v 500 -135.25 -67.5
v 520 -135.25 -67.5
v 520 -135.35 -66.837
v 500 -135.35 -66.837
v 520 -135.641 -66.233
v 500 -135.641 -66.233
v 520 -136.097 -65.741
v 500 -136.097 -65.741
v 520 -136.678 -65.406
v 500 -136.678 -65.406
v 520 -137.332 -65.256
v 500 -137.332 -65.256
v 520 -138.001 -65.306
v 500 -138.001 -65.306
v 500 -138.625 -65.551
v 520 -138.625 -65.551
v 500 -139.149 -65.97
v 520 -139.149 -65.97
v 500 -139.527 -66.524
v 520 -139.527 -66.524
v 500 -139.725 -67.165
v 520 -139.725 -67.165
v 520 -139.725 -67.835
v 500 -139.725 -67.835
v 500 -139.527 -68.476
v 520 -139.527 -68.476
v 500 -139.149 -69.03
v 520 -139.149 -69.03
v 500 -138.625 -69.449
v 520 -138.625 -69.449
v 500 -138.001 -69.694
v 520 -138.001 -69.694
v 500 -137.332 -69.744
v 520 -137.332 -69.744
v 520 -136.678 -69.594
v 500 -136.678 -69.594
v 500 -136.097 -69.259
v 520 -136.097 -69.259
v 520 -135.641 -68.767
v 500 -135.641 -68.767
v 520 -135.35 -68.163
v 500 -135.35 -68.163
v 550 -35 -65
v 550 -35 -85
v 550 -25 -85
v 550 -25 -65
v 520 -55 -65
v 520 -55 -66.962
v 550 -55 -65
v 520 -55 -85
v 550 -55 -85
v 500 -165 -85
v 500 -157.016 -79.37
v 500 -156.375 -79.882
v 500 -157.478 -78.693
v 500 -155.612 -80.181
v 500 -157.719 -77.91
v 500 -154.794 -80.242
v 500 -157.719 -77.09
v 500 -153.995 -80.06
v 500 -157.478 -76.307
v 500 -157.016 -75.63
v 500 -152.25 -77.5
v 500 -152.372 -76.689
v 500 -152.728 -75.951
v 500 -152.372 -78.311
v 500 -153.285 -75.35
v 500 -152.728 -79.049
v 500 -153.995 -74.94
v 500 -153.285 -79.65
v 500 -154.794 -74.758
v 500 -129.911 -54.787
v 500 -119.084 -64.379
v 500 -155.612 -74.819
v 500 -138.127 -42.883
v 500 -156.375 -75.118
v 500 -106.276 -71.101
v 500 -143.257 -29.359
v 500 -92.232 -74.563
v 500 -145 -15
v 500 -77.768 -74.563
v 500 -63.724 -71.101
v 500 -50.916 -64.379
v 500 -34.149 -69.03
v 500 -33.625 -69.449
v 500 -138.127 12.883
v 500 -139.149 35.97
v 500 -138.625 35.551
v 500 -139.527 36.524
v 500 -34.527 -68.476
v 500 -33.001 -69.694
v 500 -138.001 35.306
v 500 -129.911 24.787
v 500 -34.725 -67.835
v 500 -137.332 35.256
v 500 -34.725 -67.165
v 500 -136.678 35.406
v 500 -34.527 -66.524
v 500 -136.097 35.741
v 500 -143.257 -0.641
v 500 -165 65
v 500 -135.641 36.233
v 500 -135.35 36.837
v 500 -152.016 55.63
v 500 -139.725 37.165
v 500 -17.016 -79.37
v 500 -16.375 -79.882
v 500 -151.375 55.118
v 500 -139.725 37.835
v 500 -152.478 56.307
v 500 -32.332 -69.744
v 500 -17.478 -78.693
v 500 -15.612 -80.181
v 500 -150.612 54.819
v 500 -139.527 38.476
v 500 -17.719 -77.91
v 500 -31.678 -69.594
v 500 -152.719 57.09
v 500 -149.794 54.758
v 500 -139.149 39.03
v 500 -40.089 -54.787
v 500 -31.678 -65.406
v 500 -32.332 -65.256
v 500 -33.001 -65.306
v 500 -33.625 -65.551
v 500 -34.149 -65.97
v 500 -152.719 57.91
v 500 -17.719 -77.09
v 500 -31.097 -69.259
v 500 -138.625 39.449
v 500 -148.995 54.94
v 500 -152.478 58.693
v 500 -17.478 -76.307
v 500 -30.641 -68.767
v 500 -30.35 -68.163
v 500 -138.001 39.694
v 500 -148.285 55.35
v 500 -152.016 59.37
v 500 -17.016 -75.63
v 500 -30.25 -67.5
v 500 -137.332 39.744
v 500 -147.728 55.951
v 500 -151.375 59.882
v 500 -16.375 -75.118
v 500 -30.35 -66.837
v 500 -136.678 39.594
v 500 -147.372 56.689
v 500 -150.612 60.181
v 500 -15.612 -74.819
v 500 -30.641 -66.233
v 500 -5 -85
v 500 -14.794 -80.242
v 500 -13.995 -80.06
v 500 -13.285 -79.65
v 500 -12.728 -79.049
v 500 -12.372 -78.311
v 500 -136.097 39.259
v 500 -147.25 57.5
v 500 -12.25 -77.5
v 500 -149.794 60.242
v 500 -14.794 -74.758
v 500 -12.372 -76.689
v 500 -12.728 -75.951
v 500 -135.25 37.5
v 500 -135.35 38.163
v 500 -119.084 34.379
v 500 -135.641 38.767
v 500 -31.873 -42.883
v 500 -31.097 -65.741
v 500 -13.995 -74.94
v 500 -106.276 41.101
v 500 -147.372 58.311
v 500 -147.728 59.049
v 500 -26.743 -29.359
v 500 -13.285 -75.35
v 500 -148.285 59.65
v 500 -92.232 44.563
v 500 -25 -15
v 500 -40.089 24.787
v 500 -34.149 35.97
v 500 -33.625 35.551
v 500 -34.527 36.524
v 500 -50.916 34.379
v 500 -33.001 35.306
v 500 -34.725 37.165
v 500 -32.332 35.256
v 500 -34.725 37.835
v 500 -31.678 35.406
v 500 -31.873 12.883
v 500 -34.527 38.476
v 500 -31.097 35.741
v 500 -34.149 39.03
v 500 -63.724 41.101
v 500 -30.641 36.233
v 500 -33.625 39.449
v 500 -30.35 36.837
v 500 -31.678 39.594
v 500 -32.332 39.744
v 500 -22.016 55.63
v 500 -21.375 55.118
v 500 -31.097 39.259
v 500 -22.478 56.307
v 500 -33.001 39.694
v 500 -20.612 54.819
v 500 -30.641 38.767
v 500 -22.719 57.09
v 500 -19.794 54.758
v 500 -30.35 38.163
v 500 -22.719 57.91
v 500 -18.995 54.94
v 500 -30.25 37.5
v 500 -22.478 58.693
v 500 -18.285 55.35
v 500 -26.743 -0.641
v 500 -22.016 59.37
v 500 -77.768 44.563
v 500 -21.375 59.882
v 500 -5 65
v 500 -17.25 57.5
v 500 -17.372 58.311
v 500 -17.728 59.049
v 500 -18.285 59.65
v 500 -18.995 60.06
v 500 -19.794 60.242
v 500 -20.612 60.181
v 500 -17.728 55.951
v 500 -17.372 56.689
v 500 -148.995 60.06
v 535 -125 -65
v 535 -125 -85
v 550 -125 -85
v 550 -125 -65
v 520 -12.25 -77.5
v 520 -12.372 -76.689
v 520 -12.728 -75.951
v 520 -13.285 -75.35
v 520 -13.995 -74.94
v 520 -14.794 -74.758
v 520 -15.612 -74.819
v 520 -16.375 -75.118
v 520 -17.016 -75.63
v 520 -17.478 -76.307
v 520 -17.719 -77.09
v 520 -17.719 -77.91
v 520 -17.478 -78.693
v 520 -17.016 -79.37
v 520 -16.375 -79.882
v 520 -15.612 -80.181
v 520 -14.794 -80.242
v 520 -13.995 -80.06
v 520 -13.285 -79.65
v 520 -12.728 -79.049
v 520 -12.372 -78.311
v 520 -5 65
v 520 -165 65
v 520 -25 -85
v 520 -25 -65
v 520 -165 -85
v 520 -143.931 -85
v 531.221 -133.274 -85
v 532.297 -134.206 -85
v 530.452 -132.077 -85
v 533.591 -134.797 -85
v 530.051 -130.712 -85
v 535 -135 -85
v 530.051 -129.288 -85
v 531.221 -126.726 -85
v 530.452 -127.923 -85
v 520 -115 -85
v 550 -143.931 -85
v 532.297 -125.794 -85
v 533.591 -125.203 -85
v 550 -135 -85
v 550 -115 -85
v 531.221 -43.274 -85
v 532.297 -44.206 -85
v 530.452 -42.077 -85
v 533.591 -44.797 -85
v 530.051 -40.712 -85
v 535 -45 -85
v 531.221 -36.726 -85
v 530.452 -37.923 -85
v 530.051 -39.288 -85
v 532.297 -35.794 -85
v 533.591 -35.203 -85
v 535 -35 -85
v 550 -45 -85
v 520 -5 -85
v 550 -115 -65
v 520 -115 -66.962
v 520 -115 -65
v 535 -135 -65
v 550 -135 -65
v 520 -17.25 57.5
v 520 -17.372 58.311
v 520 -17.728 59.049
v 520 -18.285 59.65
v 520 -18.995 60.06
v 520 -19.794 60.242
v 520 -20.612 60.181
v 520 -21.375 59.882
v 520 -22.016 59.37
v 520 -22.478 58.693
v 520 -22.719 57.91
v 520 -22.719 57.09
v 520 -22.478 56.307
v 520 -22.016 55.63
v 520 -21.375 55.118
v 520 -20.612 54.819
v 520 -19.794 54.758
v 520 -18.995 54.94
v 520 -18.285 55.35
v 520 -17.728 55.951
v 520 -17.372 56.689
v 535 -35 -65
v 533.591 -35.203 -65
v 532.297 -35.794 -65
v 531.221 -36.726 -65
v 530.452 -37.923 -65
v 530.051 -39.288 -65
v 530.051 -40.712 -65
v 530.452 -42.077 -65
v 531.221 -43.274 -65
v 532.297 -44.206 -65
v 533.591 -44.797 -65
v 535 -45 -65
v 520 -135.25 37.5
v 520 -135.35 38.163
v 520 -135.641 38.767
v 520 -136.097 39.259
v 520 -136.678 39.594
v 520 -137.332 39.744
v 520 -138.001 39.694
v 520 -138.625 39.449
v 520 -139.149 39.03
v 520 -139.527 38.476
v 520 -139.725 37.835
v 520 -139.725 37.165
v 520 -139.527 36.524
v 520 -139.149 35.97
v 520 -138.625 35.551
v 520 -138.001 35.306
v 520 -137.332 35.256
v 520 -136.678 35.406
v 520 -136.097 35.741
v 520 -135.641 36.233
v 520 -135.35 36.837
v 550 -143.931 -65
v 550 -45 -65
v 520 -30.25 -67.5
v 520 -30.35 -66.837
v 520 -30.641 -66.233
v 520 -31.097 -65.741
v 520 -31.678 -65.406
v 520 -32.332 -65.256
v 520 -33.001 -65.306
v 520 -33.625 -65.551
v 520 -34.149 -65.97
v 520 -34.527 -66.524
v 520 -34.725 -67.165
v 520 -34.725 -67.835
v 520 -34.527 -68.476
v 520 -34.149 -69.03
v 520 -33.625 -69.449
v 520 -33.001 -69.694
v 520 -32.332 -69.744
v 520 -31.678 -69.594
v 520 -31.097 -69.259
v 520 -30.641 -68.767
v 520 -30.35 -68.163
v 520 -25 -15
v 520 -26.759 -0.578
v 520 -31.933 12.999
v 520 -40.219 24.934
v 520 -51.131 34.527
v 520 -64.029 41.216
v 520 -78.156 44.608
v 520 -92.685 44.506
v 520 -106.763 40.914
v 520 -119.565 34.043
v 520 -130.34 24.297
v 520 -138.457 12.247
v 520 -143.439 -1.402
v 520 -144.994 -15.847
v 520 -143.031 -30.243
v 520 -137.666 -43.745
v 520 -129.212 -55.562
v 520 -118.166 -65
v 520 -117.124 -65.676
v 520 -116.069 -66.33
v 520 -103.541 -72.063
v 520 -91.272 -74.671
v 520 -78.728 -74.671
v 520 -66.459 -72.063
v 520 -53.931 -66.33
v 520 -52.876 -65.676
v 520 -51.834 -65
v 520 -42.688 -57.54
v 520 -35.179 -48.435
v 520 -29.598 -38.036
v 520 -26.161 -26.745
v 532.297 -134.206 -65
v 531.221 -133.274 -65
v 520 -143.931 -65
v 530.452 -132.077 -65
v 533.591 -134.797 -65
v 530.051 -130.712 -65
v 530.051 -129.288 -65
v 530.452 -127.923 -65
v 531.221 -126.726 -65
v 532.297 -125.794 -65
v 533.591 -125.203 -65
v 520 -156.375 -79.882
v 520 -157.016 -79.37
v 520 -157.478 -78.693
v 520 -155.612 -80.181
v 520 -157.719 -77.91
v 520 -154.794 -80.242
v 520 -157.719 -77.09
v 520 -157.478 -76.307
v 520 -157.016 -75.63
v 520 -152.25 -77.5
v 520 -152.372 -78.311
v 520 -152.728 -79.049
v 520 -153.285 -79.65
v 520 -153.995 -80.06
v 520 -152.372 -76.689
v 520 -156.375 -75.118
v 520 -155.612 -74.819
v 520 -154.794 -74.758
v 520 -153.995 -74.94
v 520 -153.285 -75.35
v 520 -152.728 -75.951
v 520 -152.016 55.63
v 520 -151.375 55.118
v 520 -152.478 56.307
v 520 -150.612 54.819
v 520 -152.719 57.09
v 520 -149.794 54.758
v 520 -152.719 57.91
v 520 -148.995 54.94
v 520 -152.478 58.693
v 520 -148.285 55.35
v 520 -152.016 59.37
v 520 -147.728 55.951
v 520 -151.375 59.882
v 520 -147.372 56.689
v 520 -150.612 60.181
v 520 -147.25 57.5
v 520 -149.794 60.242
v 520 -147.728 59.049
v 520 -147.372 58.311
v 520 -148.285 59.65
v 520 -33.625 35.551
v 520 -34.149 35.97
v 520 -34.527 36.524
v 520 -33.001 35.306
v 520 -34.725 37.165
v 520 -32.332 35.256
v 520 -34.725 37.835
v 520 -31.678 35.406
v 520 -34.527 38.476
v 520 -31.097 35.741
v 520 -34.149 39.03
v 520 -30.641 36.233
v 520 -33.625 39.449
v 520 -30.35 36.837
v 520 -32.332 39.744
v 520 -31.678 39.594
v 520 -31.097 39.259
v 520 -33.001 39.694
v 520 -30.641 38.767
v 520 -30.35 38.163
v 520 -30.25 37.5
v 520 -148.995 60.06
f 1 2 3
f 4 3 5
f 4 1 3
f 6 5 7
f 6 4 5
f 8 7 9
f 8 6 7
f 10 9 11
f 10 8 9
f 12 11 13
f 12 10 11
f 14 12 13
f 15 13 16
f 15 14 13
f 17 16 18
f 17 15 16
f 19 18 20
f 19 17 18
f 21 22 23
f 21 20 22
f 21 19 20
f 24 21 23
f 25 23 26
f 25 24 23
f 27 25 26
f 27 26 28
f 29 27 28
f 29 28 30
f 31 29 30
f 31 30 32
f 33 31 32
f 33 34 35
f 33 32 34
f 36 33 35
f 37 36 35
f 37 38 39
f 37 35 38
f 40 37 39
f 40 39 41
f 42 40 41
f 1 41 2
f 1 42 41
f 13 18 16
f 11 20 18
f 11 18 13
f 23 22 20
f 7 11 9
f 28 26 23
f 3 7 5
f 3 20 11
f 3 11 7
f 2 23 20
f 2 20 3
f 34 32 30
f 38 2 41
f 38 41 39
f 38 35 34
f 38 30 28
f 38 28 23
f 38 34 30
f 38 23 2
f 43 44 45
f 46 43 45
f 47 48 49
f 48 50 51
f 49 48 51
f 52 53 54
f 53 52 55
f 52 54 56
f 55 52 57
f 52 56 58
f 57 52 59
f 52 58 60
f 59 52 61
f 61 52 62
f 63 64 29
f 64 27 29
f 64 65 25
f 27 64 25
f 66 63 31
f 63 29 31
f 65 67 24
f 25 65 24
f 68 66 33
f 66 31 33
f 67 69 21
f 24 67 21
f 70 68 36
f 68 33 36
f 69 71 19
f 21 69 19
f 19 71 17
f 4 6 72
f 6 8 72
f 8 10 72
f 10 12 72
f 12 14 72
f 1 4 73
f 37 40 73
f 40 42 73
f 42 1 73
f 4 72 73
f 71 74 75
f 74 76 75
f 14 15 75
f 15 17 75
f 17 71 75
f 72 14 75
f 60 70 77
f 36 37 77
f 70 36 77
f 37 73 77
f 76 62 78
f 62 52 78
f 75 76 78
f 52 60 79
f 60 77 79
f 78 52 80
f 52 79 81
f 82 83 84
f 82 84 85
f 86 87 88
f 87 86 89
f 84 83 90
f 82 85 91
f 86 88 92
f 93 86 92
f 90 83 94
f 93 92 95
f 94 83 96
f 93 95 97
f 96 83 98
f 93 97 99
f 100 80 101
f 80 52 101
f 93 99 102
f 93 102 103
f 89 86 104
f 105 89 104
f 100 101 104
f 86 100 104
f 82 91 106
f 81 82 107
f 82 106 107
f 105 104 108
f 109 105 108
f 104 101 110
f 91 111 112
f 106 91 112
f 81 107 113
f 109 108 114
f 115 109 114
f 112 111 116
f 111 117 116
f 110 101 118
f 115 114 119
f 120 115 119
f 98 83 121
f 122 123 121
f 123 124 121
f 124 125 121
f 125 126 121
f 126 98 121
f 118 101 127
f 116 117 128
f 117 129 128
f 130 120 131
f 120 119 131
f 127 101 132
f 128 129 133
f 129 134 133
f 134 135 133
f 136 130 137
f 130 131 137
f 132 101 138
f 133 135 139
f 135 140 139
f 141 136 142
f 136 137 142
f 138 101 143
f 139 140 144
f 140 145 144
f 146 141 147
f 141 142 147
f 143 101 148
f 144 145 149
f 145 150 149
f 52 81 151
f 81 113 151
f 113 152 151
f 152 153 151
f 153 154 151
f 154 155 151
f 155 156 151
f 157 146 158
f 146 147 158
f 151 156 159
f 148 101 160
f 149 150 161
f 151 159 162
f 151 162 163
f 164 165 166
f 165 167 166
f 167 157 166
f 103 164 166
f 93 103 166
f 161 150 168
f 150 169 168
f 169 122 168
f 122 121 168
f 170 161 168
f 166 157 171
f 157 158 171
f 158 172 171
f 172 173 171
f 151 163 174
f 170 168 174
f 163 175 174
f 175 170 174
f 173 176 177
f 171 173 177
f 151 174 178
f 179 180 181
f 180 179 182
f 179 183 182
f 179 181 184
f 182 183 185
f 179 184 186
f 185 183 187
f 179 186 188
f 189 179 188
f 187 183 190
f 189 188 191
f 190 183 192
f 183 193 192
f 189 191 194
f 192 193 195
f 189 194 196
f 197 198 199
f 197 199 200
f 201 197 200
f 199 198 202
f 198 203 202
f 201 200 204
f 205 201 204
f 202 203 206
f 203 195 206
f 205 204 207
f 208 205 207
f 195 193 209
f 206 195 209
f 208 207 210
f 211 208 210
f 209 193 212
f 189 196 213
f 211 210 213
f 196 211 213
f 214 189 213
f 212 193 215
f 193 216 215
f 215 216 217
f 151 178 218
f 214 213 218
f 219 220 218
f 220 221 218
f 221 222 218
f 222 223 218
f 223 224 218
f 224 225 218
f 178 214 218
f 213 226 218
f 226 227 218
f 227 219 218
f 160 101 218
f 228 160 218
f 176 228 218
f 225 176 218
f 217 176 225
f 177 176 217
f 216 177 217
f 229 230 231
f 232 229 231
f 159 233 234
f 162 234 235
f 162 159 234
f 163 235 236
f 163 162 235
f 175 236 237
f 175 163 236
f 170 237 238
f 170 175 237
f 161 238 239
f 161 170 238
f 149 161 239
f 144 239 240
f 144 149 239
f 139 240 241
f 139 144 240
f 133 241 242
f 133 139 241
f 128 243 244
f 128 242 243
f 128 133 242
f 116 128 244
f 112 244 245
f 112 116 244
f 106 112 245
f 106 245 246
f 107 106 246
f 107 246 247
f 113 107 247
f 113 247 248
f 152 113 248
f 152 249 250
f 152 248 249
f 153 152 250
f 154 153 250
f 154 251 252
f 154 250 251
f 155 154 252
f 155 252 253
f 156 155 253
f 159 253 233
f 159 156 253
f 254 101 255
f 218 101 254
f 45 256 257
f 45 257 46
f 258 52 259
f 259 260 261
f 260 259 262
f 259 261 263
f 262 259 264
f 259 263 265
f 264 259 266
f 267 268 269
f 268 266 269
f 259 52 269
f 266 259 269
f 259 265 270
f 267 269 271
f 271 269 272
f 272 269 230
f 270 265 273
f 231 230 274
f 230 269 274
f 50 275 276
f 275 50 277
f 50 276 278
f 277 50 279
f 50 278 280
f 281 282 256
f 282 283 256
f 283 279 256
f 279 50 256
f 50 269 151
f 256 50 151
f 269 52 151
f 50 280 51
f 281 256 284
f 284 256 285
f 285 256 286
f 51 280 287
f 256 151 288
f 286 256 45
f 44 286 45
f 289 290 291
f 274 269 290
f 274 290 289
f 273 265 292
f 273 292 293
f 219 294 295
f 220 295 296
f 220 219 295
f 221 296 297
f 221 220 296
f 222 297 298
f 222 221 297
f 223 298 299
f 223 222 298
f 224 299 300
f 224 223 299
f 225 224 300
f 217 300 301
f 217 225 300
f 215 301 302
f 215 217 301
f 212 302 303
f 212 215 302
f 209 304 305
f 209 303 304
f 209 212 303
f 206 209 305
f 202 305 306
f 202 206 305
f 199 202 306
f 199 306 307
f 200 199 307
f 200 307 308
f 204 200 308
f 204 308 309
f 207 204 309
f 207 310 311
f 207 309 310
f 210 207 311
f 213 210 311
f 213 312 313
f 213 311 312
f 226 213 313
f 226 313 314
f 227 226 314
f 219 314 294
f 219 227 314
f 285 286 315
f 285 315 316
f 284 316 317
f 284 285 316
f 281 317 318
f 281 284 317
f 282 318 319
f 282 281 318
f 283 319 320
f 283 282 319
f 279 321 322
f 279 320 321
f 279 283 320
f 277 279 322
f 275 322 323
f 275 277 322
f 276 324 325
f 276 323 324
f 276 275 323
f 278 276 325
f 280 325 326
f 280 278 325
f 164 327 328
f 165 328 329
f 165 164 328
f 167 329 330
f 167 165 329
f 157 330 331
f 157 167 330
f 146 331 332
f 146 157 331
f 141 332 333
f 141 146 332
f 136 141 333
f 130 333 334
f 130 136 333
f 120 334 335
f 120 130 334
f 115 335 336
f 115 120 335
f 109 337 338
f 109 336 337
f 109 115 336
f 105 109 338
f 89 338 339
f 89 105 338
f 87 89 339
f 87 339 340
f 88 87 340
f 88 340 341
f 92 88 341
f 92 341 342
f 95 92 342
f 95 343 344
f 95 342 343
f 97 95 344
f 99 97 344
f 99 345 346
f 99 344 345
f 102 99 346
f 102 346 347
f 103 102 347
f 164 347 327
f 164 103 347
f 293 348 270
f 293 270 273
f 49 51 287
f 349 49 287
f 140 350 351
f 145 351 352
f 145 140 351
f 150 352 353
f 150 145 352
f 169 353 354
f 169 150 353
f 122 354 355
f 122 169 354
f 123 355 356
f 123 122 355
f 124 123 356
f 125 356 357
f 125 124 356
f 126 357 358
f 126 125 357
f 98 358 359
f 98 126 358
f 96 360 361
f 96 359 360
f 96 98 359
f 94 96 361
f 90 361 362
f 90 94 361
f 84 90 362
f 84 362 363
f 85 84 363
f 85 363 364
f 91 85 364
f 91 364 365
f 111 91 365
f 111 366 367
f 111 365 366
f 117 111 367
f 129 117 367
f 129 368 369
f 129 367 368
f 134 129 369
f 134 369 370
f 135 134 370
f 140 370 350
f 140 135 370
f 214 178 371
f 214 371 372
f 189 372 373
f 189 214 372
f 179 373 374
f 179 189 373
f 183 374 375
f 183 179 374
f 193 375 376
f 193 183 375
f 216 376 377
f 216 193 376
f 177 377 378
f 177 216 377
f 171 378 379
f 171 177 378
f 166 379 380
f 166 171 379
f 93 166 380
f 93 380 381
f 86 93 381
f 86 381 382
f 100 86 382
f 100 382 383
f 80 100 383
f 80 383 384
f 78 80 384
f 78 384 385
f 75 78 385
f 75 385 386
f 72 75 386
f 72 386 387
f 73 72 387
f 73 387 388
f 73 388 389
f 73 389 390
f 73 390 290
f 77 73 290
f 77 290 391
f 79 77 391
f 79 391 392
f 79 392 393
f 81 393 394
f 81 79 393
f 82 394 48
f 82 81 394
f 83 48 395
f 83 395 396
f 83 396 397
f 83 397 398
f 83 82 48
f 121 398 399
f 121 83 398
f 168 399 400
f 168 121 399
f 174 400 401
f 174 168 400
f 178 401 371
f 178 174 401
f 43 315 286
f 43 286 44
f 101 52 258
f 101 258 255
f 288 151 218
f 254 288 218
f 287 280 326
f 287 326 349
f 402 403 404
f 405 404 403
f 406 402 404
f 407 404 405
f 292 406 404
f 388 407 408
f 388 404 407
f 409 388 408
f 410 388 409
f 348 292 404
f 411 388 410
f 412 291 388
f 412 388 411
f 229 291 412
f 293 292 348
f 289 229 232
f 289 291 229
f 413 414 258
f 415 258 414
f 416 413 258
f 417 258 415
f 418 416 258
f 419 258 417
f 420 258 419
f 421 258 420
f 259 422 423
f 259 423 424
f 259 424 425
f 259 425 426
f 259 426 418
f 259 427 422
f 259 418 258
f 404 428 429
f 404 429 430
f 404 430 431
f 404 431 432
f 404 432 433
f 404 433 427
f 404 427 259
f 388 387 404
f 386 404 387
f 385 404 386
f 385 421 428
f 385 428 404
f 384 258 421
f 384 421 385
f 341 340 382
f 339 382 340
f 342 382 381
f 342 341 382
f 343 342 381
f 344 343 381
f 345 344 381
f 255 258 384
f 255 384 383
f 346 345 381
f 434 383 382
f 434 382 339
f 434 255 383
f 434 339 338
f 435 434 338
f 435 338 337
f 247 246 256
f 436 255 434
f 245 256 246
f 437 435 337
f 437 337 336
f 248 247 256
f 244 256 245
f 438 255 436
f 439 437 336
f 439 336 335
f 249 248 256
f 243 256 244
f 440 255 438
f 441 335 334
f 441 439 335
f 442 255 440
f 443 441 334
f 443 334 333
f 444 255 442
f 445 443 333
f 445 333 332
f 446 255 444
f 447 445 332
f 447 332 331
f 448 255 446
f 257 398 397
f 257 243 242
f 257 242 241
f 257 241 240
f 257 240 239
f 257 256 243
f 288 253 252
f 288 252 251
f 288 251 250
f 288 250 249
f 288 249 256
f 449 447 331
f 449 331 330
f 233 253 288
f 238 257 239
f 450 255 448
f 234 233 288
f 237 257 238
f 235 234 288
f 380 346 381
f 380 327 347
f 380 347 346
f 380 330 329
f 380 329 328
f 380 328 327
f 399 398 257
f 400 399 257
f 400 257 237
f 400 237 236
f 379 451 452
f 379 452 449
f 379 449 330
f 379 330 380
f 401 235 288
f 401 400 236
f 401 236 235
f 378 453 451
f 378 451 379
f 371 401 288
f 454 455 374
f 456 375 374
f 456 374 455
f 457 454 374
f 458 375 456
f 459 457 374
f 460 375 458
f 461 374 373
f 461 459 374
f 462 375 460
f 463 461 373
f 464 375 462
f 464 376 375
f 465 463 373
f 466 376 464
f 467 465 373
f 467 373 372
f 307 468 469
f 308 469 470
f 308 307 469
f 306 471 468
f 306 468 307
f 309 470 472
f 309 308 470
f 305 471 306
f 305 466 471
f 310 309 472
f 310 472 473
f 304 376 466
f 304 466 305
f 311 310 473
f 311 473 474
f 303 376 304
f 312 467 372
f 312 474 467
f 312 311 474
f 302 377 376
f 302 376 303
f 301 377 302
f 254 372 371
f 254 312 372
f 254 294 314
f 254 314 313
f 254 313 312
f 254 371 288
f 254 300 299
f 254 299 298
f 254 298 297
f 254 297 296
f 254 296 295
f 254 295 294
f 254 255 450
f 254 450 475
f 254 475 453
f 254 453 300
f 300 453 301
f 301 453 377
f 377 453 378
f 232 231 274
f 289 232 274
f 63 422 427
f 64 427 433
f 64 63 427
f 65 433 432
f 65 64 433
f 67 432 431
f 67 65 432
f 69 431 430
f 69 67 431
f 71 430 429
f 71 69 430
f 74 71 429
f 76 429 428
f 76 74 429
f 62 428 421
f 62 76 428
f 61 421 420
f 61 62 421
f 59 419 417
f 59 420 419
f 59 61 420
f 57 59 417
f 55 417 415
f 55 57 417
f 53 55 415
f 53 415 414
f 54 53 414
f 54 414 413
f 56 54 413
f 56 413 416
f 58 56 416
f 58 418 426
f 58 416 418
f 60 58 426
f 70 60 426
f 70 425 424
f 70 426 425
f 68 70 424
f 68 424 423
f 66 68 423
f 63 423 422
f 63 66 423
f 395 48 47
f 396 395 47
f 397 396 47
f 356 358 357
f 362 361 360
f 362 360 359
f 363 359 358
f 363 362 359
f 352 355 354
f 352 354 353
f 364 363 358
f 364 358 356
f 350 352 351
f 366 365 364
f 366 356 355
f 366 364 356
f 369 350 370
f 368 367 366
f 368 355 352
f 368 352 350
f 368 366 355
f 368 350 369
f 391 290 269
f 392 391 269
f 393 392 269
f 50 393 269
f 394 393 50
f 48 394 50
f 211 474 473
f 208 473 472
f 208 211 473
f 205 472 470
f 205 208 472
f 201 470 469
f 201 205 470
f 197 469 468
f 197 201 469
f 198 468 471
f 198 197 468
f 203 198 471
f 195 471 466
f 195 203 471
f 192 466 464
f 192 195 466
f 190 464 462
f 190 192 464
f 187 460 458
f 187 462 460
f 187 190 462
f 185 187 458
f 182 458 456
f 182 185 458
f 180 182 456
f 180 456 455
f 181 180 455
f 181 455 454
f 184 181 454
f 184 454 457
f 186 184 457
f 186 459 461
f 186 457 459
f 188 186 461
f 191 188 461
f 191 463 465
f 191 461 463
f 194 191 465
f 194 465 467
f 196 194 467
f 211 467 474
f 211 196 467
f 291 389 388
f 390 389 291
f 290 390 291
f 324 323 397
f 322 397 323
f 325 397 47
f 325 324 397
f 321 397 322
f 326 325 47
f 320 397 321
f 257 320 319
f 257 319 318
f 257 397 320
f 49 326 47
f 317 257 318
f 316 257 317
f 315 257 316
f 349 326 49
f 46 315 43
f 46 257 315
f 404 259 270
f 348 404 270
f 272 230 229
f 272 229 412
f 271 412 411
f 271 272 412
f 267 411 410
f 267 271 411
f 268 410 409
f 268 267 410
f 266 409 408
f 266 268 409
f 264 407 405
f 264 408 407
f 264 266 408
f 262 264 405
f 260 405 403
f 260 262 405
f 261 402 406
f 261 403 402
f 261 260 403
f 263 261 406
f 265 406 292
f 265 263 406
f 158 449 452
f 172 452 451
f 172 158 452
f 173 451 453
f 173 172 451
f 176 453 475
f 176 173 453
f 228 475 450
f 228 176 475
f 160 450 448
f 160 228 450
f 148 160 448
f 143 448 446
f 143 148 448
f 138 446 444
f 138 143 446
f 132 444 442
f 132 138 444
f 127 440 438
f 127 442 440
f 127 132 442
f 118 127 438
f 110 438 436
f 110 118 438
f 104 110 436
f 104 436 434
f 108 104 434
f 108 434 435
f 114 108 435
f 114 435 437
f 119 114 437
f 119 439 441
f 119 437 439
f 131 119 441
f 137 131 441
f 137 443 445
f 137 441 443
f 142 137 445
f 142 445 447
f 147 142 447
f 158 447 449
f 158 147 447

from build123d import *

# Parameters (mm, degrees)
SKETCH002_W     = 160
SKETCH002_H     = 150
SKETCH002_R     = 60
PAD002_DEPTH    = 20
SKETCH005_R     = 2.25
HOLE002_DEPTH   = 25
SKETCH017_W     = 30
SKETCH017_H     = 30
SKETCH017_H_2   = 28.930618
PAD006_DEPTH    = 20
POCKET003_DEPTH = 50
SKETCH020_R     = 2.75
HOLE008_DEPTH   = 25
HOLE008_TIPS_R  = 2.75


with BuildPart() as part:
    # Sketch002 → Pad002 (new body)
    with BuildSketch(Plane.YZ.offset(500)):
        with Locations((-85, -10)):
            Rectangle(SKETCH002_W, SKETCH002_H)
        with Locations((-85, -15)):
            Circle(SKETCH002_R, mode=Mode.SUBTRACT)
    extrude(amount=PAD002_DEPTH)

    # Sketch005 → Hole002 (cut)
    with BuildSketch(Plane.YZ.offset(500)):
        with Locations((-137.5, 37.5)):
            Circle(SKETCH005_R)
        with Locations((-32.5, 37.5)):
            Circle(SKETCH005_R)
        with Locations((-32.5, -67.5)):
            Circle(SKETCH005_R)
        with Locations((-137.5, -67.5)):
            Circle(SKETCH005_R)
    extrude(amount=HOLE002_DEPTH, mode=Mode.SUBTRACT)

    # Sketch017 → Pad006 (join)
    with BuildSketch(Plane.XY.offset(-85)):
        with Locations((535, -40)):
            Rectangle(SKETCH017_W, SKETCH017_H)
        with Locations((535, -129.465309)):
            Rectangle(SKETCH017_W, SKETCH017_H_2)
    extrude(amount=PAD006_DEPTH)

    # Sketch018 → Pocket003 (cut)
    with BuildSketch(Plane.XY.offset(-85)):
        with BuildLine():
            ThreePointArc((535.000004, -35), (530.000002, -39.999999), (535.000002, -45))
            Line((535.000002, -45), (560, -45))
            ThreePointArc((560, -45), (565, -39.999999), (559.999998, -35))
            Line((535.000002, -35), (560, -35))
        make_face()
        with BuildLine():
            ThreePointArc((535.000002, -125), (530, -129.999999), (535, -135))
            Line((535, -135), (560, -135))
            ThreePointArc((560, -135), (565, -129.999999), (559.999998, -125))
            Line((535, -125), (560, -125))
        make_face()
    extrude(amount=POCKET003_DEPTH, mode=Mode.SUBTRACT)

    # Sketch020 → Hole008 (cut)
    with BuildSketch(Plane.YZ.offset(500)):
        with Locations((-155, -77.5)):
            Circle(SKETCH020_R)
        with Locations((-15, -77.5)):
            Circle(SKETCH020_R)
        with Locations((-150, 57.5)):
            Circle(SKETCH020_R)
        with Locations((-20, 57.5)):
            Circle(SKETCH020_R)
    extrude(amount=HOLE008_DEPTH, mode=Mode.SUBTRACT)

    # Hole008 tips → Hole008 tip 1 section 0
    with BuildSketch(Plane.YZ.offset(525), mode=Mode.PRIVATE) as hole008_tip_1_s0:
        with Locations((-155, -77.5)):
            Circle(HOLE008_TIPS_R)
    loft([hole008_tip_1_s0.sketch, Vertex(526.652367, -155, -77.5)], mode=Mode.SUBTRACT)

    # Hole008 tips → Hole008 tip 2 section 0
    with BuildSketch(Plane.YZ.offset(525), mode=Mode.PRIVATE) as hole008_tip_2_s0:
        with Locations((-15, -77.5)):
            Circle(HOLE008_TIPS_R)
    loft([hole008_tip_2_s0.sketch, Vertex(526.652367, -15, -77.5)], mode=Mode.SUBTRACT)

    # Hole008 tips → Hole008 tip 3 section 0
    with BuildSketch(Plane.YZ.offset(525), mode=Mode.PRIVATE) as hole008_tip_3_s0:
        with Locations((-150, 57.5)):
            Circle(HOLE008_TIPS_R)
    loft([hole008_tip_3_s0.sketch, Vertex(526.652367, -150, 57.5)], mode=Mode.SUBTRACT)

    # Hole008 tips → Hole008 tip 4 section 0
    with BuildSketch(Plane.YZ.offset(525), mode=Mode.PRIVATE) as hole008_tip_4_s0:
        with Locations((-20, 57.5)):
            Circle(HOLE008_TIPS_R)
    loft([hole008_tip_4_s0.sketch, Vertex(526.652367, -20, 57.5)], mode=Mode.SUBTRACT)


solid = part.part
